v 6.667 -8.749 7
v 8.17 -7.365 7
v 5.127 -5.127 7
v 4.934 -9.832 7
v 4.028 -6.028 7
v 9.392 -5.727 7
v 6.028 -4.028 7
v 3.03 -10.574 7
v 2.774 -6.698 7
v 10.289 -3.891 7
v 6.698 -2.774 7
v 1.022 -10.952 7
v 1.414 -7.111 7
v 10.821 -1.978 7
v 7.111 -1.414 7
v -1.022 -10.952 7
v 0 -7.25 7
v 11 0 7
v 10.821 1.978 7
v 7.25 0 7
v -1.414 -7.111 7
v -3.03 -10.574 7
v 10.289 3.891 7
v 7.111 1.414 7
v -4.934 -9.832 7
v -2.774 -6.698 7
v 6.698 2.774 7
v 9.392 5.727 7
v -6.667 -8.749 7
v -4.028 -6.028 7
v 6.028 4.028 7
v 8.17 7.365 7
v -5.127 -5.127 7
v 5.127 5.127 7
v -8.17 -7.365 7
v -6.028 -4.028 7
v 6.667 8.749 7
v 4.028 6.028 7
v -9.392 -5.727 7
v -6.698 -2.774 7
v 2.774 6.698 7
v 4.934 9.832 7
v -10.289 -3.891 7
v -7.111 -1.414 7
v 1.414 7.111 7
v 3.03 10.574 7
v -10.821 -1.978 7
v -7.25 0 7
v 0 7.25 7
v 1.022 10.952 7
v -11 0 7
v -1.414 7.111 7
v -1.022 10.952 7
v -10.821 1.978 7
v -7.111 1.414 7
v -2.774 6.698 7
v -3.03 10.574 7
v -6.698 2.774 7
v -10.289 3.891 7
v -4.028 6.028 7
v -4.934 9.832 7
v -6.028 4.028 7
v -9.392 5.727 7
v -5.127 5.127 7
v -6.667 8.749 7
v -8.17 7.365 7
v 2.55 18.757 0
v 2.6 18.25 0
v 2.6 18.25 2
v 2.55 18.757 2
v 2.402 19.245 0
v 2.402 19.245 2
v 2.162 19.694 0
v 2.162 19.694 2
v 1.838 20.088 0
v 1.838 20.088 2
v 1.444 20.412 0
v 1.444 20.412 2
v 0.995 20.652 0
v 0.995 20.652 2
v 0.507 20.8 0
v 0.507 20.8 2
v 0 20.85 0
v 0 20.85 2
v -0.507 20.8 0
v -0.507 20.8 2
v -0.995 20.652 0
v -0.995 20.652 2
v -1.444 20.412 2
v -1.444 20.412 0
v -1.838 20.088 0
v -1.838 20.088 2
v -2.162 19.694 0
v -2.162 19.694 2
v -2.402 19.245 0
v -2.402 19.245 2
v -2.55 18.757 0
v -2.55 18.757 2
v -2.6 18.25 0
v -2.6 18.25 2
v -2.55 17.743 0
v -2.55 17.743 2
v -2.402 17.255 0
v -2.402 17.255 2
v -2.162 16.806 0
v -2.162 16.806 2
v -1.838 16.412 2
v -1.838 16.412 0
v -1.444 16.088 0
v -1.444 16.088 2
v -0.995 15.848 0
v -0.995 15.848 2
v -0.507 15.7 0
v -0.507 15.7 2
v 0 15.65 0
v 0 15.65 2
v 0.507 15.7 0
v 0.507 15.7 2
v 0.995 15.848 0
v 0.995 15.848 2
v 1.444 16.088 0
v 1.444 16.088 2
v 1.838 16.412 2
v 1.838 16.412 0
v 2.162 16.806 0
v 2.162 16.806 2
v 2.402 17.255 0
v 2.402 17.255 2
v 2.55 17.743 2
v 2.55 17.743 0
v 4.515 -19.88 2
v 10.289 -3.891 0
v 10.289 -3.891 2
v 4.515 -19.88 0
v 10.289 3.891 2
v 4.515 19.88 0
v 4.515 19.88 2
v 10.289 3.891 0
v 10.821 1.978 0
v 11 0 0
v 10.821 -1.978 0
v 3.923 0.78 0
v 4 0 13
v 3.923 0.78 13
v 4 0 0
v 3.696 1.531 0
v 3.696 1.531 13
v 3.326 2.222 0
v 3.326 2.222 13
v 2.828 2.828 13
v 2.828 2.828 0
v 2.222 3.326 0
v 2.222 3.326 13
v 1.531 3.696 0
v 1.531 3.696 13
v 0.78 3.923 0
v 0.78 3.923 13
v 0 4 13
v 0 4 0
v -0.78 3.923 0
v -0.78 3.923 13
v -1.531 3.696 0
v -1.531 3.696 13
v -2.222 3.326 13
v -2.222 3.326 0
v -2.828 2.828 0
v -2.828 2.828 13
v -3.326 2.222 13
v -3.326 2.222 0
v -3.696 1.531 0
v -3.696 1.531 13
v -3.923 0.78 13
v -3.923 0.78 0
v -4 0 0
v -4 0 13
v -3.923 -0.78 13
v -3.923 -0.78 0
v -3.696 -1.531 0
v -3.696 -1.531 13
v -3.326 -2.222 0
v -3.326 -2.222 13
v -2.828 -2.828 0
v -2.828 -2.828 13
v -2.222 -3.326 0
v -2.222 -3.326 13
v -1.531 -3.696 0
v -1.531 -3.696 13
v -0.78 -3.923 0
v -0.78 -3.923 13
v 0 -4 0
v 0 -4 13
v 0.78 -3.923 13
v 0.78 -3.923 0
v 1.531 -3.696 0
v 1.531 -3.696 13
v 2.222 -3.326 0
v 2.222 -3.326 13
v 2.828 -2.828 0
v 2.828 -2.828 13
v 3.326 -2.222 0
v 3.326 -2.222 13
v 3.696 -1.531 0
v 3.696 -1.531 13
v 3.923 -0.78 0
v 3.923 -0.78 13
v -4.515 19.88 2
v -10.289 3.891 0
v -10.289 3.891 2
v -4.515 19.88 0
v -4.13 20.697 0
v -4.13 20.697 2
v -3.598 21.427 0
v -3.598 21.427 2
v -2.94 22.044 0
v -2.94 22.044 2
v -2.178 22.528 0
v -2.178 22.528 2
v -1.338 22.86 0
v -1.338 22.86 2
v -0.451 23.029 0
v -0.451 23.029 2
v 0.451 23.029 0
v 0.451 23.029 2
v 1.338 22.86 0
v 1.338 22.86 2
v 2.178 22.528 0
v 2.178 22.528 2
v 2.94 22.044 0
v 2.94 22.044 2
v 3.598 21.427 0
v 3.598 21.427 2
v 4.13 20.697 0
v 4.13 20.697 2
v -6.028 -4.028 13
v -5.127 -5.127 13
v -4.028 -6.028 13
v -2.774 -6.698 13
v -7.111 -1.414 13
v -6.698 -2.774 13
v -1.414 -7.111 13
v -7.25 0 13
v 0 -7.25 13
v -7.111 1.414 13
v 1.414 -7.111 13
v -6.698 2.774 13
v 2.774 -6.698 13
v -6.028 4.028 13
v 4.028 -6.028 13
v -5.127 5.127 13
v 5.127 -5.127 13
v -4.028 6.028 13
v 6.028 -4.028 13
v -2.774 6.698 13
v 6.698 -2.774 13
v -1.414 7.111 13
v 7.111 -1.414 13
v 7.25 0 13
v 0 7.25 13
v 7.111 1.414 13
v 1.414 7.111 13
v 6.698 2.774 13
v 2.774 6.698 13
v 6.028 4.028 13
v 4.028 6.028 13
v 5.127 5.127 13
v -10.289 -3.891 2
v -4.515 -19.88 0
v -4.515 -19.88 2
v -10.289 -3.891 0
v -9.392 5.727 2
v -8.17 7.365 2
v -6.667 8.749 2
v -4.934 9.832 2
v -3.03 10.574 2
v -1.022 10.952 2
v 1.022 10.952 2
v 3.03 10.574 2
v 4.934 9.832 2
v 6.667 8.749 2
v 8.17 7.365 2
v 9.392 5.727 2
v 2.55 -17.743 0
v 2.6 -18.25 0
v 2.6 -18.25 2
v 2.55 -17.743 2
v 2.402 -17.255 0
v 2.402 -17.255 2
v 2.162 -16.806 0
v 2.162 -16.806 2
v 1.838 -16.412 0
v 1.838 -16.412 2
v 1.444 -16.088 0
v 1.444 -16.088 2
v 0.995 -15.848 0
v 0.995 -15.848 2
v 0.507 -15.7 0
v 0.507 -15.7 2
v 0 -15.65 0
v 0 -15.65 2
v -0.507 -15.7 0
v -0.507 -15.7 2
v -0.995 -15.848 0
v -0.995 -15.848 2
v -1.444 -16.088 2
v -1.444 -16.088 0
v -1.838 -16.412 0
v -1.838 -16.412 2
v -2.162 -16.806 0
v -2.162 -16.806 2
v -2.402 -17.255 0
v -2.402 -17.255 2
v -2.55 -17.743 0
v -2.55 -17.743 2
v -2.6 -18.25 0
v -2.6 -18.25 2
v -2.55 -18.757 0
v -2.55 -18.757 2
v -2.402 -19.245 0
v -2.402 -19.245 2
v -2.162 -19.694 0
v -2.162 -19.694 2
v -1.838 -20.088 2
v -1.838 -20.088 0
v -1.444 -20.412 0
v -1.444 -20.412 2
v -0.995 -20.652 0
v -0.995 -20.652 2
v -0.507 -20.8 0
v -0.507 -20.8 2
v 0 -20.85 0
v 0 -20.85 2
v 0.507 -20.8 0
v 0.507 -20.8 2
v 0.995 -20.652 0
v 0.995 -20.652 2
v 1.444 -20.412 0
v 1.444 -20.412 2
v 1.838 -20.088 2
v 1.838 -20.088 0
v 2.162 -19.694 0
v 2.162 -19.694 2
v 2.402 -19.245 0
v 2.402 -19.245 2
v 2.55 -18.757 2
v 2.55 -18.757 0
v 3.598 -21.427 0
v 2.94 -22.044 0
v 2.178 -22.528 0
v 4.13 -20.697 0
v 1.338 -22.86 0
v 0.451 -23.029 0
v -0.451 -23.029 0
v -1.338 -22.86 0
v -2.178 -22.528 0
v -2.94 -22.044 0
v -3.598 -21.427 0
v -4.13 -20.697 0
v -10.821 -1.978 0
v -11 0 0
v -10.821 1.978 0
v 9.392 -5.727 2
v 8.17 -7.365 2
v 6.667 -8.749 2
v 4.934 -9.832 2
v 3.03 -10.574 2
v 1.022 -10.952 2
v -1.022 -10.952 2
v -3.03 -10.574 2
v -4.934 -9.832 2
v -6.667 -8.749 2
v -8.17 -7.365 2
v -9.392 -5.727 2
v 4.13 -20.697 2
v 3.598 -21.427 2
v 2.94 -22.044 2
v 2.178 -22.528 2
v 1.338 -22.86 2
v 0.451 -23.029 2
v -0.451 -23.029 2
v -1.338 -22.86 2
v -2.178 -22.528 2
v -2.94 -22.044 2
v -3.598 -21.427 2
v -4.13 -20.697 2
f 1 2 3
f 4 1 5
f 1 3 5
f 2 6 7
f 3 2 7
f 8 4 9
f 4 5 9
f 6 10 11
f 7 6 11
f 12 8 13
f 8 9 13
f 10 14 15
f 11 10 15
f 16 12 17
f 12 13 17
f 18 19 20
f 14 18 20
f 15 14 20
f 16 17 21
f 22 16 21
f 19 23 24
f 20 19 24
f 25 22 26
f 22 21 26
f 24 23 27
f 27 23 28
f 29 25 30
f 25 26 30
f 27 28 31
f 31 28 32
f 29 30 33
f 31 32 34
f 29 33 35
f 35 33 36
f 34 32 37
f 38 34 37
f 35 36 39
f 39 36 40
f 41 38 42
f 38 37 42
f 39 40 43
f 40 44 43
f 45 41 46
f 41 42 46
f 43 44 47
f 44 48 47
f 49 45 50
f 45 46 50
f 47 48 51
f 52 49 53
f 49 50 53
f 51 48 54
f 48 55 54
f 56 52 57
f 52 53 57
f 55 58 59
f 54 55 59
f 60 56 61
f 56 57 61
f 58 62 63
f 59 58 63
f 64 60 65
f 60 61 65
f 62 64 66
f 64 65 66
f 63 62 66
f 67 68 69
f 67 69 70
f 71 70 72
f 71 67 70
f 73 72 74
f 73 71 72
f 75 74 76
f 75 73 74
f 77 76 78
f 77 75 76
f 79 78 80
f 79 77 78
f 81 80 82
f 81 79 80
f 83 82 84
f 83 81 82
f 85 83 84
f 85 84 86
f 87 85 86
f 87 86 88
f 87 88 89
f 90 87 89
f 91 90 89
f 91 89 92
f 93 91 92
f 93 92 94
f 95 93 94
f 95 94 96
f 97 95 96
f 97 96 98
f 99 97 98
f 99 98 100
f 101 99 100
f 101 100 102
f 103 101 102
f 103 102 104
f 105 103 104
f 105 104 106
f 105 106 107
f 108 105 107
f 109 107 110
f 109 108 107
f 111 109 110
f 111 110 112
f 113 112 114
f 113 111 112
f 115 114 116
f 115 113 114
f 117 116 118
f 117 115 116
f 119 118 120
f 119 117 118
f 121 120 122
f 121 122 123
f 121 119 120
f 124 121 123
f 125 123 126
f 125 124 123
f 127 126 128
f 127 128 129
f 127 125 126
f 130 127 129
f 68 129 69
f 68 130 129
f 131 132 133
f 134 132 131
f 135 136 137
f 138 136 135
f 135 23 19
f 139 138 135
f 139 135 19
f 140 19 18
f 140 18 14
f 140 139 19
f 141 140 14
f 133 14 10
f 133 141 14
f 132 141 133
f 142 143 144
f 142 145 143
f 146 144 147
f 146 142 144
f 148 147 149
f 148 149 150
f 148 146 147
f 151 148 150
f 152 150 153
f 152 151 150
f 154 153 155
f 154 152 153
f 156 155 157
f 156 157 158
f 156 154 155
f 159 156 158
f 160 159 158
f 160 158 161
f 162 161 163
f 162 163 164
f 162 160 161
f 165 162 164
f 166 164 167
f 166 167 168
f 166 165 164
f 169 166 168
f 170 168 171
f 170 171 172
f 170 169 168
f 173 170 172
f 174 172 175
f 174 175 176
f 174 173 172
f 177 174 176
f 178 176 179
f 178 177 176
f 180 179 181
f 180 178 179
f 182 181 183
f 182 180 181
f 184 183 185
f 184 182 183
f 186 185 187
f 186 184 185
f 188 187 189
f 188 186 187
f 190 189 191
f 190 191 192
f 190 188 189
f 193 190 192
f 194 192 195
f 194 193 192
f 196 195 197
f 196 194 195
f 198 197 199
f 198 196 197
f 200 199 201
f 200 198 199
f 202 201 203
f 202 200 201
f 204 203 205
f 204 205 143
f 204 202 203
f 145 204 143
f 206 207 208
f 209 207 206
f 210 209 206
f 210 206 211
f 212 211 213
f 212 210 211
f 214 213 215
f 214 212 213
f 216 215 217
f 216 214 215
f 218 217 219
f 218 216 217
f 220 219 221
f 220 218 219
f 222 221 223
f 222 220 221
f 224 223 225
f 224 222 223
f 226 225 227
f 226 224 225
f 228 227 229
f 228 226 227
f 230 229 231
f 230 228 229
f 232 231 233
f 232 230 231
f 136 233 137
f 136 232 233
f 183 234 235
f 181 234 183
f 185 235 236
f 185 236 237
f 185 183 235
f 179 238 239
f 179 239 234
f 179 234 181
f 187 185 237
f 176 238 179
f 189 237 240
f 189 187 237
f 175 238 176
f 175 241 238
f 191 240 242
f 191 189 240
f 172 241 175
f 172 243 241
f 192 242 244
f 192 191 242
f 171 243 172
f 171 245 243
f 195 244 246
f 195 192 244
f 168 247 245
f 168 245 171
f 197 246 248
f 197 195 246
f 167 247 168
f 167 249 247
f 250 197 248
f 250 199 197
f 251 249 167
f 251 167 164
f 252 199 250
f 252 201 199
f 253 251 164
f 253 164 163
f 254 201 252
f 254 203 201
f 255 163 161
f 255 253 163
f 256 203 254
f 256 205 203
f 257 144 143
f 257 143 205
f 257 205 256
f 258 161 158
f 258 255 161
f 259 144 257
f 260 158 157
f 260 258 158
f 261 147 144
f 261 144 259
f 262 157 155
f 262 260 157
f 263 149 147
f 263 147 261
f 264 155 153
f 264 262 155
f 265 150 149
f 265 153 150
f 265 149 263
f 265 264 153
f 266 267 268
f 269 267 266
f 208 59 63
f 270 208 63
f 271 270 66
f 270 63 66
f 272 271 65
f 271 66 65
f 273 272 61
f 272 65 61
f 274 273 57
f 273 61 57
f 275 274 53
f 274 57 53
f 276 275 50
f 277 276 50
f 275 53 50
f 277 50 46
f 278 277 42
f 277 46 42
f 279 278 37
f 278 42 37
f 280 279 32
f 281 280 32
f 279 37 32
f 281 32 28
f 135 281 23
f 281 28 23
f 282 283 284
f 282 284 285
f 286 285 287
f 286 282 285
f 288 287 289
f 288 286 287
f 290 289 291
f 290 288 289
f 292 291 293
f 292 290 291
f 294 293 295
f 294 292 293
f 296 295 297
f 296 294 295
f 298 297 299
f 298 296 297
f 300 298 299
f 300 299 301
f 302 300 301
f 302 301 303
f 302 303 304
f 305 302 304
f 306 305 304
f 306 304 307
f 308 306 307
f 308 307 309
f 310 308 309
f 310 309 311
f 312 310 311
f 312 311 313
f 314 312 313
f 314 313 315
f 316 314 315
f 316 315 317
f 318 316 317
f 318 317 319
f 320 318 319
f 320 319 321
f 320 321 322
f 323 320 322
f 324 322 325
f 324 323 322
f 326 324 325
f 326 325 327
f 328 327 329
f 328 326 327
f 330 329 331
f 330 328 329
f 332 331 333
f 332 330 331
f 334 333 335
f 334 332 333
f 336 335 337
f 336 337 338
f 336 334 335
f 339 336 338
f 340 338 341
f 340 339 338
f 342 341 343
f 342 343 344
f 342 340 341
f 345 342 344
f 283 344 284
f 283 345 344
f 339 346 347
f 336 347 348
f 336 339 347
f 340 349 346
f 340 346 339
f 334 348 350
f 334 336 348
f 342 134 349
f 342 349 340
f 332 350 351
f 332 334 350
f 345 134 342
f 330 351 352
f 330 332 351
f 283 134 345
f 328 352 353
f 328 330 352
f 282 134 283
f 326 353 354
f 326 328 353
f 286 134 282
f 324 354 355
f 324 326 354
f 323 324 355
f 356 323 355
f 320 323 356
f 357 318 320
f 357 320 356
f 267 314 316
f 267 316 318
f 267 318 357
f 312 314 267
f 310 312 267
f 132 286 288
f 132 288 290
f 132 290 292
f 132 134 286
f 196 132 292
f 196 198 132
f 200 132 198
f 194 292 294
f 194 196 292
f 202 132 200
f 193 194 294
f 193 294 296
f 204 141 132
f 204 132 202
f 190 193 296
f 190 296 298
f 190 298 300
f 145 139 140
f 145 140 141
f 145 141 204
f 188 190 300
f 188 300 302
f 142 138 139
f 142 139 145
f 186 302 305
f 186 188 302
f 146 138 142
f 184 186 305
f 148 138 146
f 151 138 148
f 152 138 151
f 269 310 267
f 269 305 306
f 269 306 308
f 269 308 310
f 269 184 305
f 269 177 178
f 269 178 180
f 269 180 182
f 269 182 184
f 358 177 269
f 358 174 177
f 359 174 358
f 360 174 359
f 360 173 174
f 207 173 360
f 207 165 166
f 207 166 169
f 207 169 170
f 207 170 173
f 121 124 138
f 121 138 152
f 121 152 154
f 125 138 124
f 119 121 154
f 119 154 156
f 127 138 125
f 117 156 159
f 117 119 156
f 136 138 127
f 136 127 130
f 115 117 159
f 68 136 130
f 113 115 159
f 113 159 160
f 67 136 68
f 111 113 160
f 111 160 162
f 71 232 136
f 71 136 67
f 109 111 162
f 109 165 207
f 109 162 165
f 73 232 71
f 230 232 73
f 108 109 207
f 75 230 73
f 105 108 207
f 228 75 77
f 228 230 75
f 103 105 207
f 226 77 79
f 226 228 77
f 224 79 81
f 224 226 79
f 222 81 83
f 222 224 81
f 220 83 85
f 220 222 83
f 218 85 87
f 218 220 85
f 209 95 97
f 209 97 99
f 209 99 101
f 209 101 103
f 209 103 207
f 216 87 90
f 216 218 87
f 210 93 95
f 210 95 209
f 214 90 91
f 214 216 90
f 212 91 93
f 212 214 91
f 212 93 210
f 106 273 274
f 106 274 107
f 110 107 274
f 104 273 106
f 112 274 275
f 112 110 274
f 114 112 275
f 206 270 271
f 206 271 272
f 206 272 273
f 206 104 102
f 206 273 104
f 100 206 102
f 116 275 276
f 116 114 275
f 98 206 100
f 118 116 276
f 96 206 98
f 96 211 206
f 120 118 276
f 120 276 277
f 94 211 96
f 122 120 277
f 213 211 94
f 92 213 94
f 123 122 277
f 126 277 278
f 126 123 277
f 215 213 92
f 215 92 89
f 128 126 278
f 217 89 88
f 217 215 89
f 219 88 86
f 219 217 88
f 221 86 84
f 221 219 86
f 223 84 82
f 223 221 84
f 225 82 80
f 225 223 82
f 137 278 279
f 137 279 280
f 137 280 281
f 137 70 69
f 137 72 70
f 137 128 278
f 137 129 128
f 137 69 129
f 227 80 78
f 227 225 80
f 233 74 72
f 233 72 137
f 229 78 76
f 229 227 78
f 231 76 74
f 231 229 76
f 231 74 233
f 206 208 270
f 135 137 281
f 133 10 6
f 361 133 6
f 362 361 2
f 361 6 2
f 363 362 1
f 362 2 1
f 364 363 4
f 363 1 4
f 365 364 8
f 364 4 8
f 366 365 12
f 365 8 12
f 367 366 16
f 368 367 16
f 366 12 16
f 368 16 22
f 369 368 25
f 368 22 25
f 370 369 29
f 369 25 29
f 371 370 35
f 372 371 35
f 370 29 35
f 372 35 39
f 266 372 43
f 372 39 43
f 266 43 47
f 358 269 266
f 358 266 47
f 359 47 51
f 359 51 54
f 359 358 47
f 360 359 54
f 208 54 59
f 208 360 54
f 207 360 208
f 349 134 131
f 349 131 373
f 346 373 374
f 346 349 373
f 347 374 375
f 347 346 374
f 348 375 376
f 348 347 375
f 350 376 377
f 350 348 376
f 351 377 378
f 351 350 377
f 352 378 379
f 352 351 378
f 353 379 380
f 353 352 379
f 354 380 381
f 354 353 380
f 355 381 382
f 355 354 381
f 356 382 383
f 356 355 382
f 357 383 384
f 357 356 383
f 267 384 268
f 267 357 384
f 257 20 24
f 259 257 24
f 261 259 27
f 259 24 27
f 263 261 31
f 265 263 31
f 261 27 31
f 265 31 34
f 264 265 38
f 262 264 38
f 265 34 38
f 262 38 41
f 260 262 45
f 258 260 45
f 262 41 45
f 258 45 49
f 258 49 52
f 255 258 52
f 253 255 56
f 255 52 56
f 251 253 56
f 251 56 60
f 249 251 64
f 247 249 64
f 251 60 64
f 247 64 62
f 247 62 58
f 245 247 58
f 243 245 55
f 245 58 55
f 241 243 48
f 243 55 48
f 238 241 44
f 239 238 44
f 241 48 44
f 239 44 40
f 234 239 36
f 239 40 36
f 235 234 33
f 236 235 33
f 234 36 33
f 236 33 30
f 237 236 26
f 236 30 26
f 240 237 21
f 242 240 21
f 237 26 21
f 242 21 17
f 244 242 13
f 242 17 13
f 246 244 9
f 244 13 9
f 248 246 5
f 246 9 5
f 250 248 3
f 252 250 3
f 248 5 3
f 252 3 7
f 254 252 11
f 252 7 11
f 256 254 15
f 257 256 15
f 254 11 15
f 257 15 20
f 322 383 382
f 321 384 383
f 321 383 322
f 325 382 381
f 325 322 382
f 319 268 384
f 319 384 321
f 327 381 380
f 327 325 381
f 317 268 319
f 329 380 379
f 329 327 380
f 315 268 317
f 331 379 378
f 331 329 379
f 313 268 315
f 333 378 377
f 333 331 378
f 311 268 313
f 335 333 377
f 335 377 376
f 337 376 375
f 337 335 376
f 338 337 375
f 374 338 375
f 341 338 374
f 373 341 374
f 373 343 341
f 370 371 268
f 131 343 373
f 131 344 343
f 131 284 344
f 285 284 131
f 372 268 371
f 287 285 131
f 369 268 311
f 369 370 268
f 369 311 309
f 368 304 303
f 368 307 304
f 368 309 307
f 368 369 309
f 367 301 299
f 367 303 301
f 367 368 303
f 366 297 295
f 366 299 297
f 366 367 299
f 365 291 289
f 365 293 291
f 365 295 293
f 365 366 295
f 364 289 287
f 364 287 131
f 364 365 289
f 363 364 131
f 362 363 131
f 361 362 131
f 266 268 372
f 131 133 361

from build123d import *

# Parameters (mm, degrees)
CROQUIS1_R              = 4
CROQUIS1_R_2            = 2.6
SALIENTE_EXTRUIR1_DEPTH = 7
CROQUIS2_R              = 2.6
CORTAR_EXTRUIR1_DEPTH   = 5
CROQUIS3_R              = 7.25
CROQUIS3_R_2            = 4
SALIENTE_EXTRUIR2_DEPTH = 6


with BuildPart() as part:
    # Croquis1 → Saliente-Extruir1 (new body)
    with BuildSketch(Plane.XY):
        with BuildLine():
            Line((10.288824315, -3.891027397), (4.514634908, -19.880359362))
            ThreePointArc((4.514634908, -19.880359362), (0, -23.05), (-4.514634908, -19.880359362))
            Line((-4.514634908, -19.880359362), (-10.288824315, -3.891027397))
            ThreePointArc((-10.288824315, -3.891027397), (-11, 0), (-10.288824315, 3.891027397))
            Line((-10.288824315, 3.891027397), (-4.514634908, 19.880359362))
            ThreePointArc((-4.514634908, 19.880359362), (0, 23.05), (4.514634908, 19.880359362))
            Line((4.514634908, 19.880359362), (10.288824315, 3.891027397))
            ThreePointArc((10.288824315, 3.891027397), (11, 0), (10.288824315, -3.891027397))
        make_face()
        Circle(CROQUIS1_R, mode=Mode.SUBTRACT)
        with Locations((0, 18.25)):
            Circle(CROQUIS1_R_2, mode=Mode.SUBTRACT)
        with Locations((0, -18.25)):
            Circle(CROQUIS1_R_2, mode=Mode.SUBTRACT)
    extrude(amount=SALIENTE_EXTRUIR1_DEPTH)

    # Croquis2 → Cortar-Extruir1 (cut)
    with BuildSketch(Plane.XY.offset(7)):
        with BuildLine():
            Line((-4.514634908, 19.880359362), (-10.288824315, 3.891027397))
            ThreePointArc((-10.288824315, 3.891027397), (0, 11), (10.288824315, 3.891027397))
            Line((10.288824315, 3.891027397), (4.514634908, 19.880359362))
            ThreePointArc((4.514634908, 19.880359362), (0, 23.05), (-4.514634908, 19.880359362))
        make_face()
        with Locations((0, 18.25)):
            Circle(CROQUIS2_R, mode=Mode.SUBTRACT)
        with BuildLine():
            ThreePointArc((10.288824315, -3.891027397), (0, -11), (-10.288824315, -3.891027397))
            Line((-10.288824315, -3.891027397), (-4.514634908, -19.880359362))
            ThreePointArc((-4.514634908, -19.880359362), (0, -23.05), (4.514634908, -19.880359362))
            Line((4.514634908, -19.880359362), (10.288824315, -3.891027397))
        make_face()
        with Locations((0, -18.25)):
            Circle(CROQUIS2_R, mode=Mode.SUBTRACT)
    extrude(amount=-CORTAR_EXTRUIR1_DEPTH, mode=Mode.SUBTRACT)

    # Croquis3 → Saliente-Extruir2 (add)
    with BuildSketch(Plane.XY.offset(7)):
        Circle(CROQUIS3_R)
        Circle(CROQUIS3_R_2, mode=Mode.SUBTRACT)
    extrude(amount=SALIENTE_EXTRUIR2_DEPTH)


solid = part.part
